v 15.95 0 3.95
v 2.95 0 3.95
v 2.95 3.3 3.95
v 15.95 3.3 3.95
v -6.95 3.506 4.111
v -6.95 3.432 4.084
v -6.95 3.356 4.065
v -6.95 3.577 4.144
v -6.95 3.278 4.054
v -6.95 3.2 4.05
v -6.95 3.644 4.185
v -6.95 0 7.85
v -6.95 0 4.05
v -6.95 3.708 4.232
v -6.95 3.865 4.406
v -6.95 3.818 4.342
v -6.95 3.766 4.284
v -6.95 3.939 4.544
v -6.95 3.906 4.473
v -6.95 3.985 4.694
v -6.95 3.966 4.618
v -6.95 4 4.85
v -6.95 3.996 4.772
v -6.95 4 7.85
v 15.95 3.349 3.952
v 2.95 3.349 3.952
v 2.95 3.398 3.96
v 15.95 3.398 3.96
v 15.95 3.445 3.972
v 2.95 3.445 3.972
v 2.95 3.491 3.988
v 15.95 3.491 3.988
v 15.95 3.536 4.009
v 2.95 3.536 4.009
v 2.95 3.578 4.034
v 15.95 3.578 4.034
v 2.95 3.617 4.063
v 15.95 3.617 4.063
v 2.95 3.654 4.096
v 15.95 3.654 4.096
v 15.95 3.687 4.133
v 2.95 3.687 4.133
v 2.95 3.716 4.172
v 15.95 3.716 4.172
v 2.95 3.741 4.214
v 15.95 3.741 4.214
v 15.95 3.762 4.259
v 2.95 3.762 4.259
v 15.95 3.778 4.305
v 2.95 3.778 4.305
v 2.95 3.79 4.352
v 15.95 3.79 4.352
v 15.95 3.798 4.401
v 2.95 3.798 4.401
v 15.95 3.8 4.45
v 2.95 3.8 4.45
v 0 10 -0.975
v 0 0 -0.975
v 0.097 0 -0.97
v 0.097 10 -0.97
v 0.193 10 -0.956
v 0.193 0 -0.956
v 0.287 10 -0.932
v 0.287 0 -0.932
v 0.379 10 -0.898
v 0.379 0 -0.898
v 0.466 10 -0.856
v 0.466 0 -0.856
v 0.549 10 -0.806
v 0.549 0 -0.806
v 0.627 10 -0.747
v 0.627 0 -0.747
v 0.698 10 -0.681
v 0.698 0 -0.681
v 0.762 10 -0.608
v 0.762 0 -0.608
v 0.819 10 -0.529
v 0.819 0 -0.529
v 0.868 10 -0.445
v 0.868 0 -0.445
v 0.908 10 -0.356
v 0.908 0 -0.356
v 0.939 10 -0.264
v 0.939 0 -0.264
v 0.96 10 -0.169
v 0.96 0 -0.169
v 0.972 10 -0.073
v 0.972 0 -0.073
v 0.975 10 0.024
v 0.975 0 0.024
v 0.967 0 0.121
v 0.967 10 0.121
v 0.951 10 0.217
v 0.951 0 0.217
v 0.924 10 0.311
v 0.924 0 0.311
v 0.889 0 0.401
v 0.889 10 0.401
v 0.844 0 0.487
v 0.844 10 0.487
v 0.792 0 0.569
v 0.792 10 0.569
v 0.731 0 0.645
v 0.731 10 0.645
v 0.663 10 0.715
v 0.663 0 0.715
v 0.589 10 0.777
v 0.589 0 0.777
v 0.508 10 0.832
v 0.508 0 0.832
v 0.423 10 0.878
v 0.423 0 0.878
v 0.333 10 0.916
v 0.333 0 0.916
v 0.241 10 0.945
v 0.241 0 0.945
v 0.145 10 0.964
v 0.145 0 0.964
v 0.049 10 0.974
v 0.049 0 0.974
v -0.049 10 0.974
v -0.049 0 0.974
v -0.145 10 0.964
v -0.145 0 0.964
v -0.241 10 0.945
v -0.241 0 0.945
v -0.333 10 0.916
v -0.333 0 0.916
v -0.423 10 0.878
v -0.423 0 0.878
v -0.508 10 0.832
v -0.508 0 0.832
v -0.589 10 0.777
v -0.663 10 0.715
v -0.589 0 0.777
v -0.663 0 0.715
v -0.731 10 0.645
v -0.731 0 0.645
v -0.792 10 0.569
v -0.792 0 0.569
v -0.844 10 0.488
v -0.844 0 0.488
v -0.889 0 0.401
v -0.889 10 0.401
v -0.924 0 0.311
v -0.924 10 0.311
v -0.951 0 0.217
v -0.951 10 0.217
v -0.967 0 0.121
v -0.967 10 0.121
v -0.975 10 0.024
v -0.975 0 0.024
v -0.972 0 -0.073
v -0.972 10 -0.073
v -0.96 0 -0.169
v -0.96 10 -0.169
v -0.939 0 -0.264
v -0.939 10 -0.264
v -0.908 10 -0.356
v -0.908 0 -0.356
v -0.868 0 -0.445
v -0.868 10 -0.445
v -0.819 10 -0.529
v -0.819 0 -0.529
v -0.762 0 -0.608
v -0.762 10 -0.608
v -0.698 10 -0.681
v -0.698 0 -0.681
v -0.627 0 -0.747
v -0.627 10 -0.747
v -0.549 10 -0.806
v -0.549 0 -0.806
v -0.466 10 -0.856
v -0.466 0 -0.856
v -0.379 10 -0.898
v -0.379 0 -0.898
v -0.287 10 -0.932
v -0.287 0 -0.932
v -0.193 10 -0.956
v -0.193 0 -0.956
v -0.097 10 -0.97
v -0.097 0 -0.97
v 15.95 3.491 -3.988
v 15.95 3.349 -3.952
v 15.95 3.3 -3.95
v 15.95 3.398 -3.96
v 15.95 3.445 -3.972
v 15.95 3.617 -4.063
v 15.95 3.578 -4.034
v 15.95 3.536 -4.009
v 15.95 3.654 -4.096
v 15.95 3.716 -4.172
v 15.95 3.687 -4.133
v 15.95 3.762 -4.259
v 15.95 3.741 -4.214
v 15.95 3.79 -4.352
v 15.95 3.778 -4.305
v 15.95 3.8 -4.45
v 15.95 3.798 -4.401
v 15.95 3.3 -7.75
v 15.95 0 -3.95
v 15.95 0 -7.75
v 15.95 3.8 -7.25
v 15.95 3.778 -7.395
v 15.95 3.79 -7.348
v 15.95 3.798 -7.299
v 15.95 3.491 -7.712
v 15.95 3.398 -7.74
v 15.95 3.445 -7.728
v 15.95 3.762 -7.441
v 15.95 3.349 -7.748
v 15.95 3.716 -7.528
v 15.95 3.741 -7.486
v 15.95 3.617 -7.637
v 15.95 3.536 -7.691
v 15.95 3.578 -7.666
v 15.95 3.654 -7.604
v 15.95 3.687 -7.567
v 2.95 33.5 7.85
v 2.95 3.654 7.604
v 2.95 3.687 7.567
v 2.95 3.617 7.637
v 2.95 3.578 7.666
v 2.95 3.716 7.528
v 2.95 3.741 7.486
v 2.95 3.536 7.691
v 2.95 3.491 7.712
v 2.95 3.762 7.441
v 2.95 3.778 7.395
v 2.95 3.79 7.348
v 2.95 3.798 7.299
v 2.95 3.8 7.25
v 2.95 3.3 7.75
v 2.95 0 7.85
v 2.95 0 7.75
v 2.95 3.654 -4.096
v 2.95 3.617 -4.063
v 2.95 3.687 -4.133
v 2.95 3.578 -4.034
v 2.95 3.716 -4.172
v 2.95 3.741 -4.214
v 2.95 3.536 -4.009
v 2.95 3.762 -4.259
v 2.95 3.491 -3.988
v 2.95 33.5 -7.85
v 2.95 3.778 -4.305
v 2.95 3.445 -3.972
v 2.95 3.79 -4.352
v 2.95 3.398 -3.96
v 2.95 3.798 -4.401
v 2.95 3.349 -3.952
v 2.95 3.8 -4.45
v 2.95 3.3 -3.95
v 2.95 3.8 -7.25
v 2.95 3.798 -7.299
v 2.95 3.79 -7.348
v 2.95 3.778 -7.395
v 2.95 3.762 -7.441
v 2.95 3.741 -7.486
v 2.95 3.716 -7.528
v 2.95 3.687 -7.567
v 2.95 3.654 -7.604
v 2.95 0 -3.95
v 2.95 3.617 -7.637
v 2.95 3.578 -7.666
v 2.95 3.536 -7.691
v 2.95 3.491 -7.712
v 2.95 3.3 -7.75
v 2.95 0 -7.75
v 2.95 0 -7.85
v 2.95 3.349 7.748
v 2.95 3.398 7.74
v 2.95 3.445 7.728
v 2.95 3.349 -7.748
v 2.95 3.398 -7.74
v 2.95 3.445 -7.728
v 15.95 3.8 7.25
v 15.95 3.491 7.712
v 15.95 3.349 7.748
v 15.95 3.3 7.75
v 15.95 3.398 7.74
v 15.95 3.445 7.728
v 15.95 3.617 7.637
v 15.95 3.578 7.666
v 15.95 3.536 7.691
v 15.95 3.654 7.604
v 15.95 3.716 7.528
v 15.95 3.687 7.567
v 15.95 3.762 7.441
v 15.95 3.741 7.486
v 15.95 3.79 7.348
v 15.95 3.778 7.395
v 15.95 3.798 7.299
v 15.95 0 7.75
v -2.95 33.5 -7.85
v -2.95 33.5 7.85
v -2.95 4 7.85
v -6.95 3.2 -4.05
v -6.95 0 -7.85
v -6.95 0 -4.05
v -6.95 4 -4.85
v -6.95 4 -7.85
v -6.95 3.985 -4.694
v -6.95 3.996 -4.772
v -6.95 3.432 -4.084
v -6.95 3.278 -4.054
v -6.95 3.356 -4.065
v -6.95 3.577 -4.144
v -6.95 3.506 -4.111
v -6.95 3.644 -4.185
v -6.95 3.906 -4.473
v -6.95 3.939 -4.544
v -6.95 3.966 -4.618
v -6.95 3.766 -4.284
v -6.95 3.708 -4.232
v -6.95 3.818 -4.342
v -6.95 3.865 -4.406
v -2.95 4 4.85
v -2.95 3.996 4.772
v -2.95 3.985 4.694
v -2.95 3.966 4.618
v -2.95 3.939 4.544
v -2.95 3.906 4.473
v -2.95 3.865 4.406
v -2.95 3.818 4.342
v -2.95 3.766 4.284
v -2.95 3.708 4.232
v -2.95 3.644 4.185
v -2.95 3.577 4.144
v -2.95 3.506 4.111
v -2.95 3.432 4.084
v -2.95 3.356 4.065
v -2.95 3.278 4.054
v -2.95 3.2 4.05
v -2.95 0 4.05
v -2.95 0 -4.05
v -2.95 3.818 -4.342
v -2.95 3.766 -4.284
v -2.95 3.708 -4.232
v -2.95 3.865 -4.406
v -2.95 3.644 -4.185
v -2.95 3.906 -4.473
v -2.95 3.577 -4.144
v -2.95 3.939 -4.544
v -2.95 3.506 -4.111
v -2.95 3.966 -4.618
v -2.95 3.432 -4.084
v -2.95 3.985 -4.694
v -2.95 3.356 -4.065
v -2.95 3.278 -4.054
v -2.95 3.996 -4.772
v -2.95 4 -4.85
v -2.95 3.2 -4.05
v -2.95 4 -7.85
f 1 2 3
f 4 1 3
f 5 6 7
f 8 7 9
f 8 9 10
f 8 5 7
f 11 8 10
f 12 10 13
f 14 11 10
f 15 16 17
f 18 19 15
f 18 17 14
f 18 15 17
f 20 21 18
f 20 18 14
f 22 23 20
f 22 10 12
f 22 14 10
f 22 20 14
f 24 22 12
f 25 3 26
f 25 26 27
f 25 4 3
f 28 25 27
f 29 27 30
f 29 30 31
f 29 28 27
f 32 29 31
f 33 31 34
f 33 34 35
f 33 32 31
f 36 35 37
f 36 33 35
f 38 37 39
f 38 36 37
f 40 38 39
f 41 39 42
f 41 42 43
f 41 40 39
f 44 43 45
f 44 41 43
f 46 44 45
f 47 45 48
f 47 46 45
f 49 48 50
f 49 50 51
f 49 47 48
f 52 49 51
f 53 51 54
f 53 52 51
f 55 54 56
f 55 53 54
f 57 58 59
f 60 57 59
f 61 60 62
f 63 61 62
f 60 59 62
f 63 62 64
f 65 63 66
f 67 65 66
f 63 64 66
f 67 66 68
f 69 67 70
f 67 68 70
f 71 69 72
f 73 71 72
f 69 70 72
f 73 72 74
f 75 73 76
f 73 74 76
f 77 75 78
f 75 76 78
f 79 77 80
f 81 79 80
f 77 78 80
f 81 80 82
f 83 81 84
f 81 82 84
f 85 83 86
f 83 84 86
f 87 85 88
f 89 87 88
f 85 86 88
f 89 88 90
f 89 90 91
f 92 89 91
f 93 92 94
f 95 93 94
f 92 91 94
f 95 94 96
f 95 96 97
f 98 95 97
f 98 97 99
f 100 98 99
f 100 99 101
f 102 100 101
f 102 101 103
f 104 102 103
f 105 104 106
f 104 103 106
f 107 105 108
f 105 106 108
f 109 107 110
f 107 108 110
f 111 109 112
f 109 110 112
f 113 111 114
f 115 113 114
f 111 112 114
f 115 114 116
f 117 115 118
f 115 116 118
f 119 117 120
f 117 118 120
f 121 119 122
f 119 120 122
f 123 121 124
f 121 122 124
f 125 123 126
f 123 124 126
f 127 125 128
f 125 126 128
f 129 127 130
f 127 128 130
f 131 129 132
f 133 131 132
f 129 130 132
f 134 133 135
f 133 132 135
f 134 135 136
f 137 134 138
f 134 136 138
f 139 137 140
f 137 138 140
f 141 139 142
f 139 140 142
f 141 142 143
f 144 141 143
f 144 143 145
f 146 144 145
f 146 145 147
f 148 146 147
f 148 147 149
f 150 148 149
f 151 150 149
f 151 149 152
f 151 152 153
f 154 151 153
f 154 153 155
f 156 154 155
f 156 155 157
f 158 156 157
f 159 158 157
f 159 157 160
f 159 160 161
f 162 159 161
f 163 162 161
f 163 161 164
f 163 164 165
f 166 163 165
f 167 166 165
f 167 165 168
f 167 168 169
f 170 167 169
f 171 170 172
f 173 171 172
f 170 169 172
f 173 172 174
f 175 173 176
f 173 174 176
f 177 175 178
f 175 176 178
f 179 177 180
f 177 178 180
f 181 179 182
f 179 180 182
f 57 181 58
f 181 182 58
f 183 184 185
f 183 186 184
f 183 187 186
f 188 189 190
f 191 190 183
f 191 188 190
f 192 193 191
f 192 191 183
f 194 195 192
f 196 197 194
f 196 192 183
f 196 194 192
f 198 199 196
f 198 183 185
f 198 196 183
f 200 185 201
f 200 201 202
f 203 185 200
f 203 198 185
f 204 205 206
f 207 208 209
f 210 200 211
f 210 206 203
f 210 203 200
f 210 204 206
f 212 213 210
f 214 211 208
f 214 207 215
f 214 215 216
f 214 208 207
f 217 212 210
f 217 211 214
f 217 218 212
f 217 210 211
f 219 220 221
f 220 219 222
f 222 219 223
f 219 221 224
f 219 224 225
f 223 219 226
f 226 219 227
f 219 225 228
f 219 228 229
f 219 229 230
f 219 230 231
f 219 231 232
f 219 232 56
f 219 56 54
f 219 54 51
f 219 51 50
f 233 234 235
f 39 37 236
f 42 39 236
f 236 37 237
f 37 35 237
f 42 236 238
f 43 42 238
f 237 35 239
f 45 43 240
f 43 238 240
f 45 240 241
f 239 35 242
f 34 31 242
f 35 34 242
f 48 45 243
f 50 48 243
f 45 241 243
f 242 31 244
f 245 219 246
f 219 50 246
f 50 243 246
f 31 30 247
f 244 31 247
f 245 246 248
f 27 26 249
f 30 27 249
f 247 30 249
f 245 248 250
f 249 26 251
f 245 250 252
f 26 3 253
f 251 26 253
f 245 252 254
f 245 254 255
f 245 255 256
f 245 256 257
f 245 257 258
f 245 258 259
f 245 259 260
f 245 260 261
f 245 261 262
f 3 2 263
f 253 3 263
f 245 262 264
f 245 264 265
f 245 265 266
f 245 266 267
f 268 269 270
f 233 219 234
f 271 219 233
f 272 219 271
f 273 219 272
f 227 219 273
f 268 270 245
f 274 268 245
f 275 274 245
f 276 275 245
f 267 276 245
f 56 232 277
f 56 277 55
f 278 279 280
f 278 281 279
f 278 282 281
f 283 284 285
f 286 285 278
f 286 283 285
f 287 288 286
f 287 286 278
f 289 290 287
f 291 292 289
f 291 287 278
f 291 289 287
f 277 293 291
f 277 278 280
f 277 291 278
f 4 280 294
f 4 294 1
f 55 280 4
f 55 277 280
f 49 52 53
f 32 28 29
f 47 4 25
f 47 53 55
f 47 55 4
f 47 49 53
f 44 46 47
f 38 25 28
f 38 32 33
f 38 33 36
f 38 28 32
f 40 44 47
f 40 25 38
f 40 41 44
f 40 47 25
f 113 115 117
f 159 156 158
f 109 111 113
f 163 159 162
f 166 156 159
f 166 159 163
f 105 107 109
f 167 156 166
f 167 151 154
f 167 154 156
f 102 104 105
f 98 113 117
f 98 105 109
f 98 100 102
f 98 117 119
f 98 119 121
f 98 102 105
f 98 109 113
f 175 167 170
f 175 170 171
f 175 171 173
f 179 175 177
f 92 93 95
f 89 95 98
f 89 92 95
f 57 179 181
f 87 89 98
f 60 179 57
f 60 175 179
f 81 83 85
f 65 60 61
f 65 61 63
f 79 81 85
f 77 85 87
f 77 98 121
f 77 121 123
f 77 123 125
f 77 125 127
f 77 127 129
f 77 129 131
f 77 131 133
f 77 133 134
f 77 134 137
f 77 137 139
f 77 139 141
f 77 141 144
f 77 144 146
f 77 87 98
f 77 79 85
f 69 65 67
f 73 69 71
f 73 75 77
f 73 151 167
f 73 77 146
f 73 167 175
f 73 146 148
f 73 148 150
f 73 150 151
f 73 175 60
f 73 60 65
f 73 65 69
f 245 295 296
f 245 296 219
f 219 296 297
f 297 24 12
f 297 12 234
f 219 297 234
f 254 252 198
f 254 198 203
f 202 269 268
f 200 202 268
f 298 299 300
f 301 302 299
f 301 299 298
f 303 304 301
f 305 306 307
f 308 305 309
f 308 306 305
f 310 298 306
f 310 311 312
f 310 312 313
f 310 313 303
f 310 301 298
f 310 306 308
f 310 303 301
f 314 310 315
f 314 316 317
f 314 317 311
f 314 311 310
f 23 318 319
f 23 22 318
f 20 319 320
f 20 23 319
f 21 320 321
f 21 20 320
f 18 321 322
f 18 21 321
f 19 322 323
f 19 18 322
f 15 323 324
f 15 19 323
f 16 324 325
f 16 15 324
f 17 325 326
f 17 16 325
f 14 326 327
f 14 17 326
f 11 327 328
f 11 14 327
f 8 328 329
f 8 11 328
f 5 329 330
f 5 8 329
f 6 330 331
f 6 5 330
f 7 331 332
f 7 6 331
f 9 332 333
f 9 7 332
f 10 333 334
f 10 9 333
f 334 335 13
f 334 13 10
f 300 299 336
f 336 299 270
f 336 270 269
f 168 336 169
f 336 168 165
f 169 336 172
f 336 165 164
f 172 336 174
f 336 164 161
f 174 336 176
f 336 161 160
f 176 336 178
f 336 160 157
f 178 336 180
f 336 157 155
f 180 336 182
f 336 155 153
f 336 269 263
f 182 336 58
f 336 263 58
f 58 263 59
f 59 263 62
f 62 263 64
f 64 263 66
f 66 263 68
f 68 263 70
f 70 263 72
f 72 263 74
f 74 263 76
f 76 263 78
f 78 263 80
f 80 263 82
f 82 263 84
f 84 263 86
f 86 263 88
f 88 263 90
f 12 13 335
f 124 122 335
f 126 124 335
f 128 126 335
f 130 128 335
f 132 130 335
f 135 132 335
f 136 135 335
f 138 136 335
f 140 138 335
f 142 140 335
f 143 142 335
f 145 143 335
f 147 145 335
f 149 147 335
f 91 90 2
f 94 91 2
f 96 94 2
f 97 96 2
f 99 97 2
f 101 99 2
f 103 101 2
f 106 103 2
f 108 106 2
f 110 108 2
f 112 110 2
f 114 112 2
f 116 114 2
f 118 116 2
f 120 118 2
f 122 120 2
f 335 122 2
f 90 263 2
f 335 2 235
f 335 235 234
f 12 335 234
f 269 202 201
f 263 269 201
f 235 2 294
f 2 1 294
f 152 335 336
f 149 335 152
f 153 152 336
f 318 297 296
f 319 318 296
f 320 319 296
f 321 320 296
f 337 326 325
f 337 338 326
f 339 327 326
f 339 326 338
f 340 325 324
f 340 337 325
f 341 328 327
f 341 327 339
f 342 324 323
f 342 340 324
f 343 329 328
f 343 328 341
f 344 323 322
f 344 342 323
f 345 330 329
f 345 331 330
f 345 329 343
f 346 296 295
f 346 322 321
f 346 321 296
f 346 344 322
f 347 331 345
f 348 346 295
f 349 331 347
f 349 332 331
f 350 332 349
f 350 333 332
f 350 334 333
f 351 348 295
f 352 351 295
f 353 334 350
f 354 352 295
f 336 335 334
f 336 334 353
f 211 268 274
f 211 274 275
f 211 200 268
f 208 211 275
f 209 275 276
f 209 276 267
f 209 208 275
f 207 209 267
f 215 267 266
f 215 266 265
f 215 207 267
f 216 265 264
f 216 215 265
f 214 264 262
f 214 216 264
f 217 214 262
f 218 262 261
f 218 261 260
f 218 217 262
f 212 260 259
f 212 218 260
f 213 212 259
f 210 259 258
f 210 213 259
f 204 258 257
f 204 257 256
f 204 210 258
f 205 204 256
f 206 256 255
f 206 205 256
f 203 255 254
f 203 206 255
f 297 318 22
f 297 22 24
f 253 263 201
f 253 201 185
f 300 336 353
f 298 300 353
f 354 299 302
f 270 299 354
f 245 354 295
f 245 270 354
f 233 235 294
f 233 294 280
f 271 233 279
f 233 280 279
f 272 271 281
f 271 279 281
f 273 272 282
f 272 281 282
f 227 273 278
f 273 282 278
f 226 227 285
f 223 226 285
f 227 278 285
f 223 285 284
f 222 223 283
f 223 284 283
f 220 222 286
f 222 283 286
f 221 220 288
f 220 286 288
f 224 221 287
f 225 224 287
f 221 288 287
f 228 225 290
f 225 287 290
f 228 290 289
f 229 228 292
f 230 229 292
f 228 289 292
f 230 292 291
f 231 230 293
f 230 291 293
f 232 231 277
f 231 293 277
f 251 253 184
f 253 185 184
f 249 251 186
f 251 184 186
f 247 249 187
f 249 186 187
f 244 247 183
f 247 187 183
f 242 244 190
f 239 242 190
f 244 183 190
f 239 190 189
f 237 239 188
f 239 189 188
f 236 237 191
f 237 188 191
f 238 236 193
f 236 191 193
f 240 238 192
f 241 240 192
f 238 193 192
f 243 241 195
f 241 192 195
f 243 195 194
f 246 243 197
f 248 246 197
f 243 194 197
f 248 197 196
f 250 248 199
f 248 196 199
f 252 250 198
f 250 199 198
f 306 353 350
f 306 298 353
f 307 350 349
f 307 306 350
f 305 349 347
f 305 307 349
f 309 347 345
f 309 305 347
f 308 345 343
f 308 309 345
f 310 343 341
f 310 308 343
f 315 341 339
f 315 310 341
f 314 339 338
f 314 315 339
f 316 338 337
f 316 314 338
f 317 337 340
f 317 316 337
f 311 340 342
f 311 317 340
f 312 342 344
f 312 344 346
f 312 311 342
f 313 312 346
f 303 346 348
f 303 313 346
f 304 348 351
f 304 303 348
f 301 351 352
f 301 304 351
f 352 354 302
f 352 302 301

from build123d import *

# Parameters (mm, degrees)
SKETCH_2_W          = 5.9
SKETCH_2_H          = 15.7
EXTRUDE_1_DEPTH     = 33.5
SKETCH_3_R          = 0.975
CUT_EXTRUDE_1_DEPTH = 10
SKETCH_4_W          = 3.8
SKETCH_4_H          = 3.8
EXTRUDE_2_DEPTH     = 13
SKETCH_5_W          = 3.8
SKETCH_5_H          = 4
EXTRUDE_3_DEPTH     = 4
FILLET_1_R          = 0.8
FILLET_2_R          = 0.5


with BuildPart() as part:
    # ｽｹｯﾁ2 → ﾎﾞｽ - 押し出し1 (new body)
    with BuildSketch(Plane(origin=(0, 0, 0), x_dir=(1, 0, 0), z_dir=(0, 1, 0))):
        Rectangle(SKETCH_2_W, SKETCH_2_H)
    extrude(amount=EXTRUDE_1_DEPTH)

    # ｽｹｯﾁ3 → ｶｯﾄ - 押し出し1 (cut)
    with BuildSketch(Plane.XZ):
        with Locations(Location((0, 0, 0), (0, 0, 270))):
            Circle(SKETCH_3_R)
    extrude(amount=-CUT_EXTRUDE_1_DEPTH, mode=Mode.SUBTRACT)

    # ｽｹｯﾁ4 → ﾎﾞｽ - 押し出し2 (add)
    with BuildSketch(Plane(origin=(2.95, 0, 0), x_dir=(0, 0, -1), z_dir=(1, 0, 0))):
        with Locations((-5.85, 1.9)):
            Rectangle(SKETCH_4_W, SKETCH_4_H)
        with Locations((5.85, 1.9)):
            Rectangle(SKETCH_4_W, SKETCH_4_H)
    extrude(amount=EXTRUDE_2_DEPTH)

    # ｽｹｯﾁ5 → ﾎﾞｽ - 押し出し3 (add)
    with BuildSketch(Plane.ZY.offset(2.95)):
        with Locations((-5.95, 2)):
            Rectangle(SKETCH_5_W, SKETCH_5_H)
        with Locations((5.95, 2)):
            Rectangle(SKETCH_5_W, SKETCH_5_H)
    extrude(amount=EXTRUDE_3_DEPTH)

    # ﾌｨﾚｯﾄ1
    fillet_1_edges = [part.edges().sort_by_distance(p)[0] for p in [
        (-4.95, 4, -4.05),
        (-4.95, 4, 4.05),
    ]]
    fillet(fillet_1_edges, radius=FILLET_1_R)

    # ﾌｨﾚｯﾄ2
    fillet_2_edges = [part.edges().sort_by_distance(p)[0] for p in [
        (9.45, 3.8, 7.75),
        (9.45, 3.8, 3.95),
        (9.45, 3.8, -3.95),
        (9.45, 3.8, -7.75),
    ]]
    fillet(fillet_2_edges, radius=FILLET_2_R)


solid = part.part
